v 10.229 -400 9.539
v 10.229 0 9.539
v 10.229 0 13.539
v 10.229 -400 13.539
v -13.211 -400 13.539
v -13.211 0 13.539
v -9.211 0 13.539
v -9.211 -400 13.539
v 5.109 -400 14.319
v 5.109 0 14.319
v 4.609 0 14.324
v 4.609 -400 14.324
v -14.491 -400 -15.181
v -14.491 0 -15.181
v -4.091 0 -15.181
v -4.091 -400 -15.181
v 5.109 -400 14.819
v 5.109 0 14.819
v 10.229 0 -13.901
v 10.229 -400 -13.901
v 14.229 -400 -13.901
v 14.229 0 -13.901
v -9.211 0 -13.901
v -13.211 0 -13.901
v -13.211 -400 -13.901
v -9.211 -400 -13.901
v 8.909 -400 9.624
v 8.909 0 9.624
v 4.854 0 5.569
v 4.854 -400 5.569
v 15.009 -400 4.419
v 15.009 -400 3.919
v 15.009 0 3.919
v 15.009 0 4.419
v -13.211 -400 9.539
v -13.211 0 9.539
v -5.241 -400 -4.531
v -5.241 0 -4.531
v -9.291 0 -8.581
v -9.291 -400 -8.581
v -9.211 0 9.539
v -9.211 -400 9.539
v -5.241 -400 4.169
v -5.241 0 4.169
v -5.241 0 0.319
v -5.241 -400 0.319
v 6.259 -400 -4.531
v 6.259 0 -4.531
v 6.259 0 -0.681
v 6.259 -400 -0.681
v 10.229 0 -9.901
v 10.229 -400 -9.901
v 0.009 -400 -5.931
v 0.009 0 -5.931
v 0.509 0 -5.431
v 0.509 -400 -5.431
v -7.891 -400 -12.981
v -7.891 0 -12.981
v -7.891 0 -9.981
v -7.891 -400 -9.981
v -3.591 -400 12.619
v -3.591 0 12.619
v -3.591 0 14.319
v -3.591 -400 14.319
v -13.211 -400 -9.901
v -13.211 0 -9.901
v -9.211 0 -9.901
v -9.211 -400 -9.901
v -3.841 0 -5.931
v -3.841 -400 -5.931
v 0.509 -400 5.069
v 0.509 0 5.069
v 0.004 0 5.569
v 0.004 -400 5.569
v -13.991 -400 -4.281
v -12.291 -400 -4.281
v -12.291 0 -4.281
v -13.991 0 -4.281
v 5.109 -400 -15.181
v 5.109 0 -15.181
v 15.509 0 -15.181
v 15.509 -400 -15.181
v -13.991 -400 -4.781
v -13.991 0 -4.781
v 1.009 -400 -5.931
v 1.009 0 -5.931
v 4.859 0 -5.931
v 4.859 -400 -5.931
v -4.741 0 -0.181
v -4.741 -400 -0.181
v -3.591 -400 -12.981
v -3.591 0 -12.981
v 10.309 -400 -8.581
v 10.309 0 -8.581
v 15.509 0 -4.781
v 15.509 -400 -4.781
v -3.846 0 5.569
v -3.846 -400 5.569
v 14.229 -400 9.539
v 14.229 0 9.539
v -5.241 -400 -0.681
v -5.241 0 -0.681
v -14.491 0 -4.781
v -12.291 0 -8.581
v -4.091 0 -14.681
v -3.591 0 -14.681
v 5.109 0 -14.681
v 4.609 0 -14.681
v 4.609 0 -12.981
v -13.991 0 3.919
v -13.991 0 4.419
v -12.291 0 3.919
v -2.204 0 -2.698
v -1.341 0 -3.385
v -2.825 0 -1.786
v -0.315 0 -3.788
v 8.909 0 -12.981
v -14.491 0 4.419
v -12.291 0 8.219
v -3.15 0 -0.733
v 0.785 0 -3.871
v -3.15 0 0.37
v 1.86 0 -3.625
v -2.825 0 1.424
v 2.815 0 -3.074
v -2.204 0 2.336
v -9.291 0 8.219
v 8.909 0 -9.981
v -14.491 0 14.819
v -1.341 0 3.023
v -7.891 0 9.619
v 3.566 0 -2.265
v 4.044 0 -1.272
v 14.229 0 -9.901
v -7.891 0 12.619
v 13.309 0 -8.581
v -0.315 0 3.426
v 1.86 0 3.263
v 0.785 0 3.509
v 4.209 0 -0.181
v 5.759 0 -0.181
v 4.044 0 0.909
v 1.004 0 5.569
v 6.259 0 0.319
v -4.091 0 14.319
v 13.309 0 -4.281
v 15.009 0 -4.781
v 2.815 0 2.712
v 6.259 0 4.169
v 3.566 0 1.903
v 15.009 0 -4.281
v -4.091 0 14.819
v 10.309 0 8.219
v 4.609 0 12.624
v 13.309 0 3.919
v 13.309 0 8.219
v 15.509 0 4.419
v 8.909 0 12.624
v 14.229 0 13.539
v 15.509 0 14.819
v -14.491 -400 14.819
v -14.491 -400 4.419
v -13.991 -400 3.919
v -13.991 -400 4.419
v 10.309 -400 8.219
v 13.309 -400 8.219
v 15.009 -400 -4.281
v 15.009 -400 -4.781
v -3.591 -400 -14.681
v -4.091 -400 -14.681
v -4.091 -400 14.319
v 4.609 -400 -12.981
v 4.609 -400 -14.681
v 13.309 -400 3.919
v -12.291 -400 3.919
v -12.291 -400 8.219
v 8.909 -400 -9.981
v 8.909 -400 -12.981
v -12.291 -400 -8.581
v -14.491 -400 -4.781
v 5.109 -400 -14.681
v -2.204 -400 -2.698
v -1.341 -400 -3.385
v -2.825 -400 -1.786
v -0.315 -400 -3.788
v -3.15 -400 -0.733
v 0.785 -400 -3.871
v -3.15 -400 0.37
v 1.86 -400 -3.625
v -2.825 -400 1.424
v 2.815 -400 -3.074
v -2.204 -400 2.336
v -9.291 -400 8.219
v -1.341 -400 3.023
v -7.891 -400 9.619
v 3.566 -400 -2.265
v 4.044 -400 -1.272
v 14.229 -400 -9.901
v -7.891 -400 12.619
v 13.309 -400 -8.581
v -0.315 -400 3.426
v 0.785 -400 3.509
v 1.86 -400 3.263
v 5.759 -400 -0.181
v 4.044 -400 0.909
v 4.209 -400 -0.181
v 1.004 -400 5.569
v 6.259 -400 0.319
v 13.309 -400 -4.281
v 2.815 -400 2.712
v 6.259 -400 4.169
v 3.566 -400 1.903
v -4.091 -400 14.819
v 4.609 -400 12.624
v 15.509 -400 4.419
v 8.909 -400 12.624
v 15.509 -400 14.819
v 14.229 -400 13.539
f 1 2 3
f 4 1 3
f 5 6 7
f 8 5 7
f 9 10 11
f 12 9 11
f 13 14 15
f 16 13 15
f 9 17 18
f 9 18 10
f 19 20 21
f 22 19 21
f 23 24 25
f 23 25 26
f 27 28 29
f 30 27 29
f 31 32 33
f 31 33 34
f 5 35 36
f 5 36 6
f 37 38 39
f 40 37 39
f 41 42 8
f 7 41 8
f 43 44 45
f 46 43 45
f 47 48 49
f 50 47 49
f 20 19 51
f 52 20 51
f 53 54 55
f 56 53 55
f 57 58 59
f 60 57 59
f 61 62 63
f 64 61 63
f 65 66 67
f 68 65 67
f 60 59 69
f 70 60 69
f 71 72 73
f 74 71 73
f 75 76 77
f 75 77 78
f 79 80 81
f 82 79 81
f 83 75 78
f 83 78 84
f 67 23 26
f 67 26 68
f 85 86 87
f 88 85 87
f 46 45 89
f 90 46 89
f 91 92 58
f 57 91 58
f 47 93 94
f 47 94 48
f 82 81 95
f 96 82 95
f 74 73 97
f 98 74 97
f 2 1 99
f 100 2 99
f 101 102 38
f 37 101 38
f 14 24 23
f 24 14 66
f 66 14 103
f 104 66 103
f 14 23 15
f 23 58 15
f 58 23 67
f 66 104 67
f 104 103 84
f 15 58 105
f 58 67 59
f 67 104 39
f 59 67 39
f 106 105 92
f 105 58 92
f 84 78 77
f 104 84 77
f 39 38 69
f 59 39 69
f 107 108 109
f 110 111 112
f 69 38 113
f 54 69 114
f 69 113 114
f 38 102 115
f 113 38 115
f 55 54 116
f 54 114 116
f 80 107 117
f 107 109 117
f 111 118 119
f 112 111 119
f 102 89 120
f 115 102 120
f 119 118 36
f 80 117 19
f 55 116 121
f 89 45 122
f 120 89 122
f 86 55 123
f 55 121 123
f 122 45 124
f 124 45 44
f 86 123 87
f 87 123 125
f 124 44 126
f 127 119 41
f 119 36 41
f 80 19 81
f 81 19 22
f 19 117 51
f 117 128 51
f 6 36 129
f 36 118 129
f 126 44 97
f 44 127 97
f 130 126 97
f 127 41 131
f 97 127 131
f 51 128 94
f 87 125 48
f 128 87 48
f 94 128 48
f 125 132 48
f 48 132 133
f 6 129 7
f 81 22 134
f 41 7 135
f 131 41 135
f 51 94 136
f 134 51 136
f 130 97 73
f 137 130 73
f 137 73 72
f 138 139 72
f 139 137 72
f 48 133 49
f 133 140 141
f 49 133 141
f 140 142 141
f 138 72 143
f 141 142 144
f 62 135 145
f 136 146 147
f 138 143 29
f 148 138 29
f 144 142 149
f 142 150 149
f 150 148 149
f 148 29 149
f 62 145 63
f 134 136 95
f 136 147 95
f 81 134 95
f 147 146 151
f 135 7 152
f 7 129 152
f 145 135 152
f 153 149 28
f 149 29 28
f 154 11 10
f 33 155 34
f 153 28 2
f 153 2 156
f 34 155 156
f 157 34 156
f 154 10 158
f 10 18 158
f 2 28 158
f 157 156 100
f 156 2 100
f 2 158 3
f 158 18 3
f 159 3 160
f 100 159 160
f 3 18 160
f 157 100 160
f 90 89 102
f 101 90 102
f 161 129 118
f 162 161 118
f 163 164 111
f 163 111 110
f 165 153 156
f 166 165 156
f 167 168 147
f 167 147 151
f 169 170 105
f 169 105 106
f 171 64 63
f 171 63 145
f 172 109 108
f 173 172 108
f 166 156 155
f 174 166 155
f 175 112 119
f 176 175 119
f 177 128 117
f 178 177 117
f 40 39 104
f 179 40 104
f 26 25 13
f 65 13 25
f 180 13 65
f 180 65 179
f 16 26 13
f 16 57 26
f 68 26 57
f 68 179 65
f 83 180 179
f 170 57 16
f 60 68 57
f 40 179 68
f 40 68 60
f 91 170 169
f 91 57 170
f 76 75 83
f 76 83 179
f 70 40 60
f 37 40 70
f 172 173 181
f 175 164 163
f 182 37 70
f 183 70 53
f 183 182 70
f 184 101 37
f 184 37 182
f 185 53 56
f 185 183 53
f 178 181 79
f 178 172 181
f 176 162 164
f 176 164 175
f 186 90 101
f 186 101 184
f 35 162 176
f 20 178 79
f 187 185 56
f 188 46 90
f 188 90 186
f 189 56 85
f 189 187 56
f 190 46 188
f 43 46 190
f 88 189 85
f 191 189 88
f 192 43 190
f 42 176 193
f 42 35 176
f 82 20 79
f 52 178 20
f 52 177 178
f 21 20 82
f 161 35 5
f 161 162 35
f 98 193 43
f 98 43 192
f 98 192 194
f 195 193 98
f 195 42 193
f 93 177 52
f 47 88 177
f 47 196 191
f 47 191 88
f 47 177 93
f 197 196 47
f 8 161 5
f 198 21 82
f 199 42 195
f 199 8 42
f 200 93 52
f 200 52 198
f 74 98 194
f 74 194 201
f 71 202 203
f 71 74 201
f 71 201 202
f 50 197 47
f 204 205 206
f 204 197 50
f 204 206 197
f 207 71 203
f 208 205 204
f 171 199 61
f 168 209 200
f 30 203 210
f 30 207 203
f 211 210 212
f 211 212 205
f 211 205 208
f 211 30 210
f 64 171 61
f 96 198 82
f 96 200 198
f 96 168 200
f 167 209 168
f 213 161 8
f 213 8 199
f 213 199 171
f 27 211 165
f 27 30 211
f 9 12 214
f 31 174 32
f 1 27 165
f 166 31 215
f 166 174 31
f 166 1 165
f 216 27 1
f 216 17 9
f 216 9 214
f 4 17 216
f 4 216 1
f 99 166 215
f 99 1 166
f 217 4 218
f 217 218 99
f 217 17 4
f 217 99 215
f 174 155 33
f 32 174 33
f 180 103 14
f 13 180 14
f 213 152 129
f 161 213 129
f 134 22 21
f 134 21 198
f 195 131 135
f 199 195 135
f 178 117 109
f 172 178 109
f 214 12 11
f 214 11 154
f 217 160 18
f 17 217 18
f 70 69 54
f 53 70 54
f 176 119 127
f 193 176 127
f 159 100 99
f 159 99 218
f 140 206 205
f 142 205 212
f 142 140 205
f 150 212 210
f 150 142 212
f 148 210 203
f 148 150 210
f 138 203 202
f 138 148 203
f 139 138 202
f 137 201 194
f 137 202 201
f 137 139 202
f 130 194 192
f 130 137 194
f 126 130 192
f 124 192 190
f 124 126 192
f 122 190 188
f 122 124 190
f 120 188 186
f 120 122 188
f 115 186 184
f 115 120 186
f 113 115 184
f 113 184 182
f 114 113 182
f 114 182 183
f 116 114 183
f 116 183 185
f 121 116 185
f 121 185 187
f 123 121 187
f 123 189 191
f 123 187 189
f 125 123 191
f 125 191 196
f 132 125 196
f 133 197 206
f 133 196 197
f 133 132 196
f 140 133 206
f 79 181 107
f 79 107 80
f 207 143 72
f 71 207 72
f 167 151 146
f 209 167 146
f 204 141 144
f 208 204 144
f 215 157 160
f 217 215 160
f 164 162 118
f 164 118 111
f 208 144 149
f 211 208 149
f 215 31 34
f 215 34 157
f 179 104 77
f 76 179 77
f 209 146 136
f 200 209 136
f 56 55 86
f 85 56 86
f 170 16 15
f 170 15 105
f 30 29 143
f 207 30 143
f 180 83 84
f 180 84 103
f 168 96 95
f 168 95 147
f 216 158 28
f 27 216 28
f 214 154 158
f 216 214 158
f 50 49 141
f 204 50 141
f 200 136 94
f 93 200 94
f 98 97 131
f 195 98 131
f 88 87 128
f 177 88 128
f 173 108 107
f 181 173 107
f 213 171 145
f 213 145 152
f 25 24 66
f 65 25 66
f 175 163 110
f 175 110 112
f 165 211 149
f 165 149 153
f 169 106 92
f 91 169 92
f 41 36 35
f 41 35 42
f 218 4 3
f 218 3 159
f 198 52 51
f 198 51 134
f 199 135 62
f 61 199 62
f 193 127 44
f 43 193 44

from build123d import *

# Parameters (mm, degrees)
F2_DEPTH = 400
F1_R     = 3.7
F1_W     = 4
F1_H     = 4
F3_DEPTH = 400.001


with BuildPart() as f2:
    # F0 (on Front) → F2 (new body)
    with BuildSketch(Plane.XZ):
        Polygon((-4.091443, 14.818899), (-14.491443, 14.818899), (-14.491443, 4.418899), (-13.991443, 4.418899), (-13.991443, 3.918899), (-12.291443, 3.918899), (-12.291443, 8.218899), (-9.291443, 8.218899), (-5.241443, 4.168899), (-5.241443, 0.318899), (-4.741443, -0.181101), (-5.241443, -0.681101), (-5.241443, -4.531101), (-9.291443, -8.581101), (-12.291443, -8.581101), (-12.291443, -4.281101), (-13.991443, -4.281101), (-13.991443, -4.781101), (-14.491443, -4.781101), (-14.491443, -15.181101), (-4.091443, -15.181101), (-4.091443, -14.681101), (-3.591443, -14.681101), (-3.591443, -12.981101), (-7.891443, -12.981101), (-7.891443, -9.981101), (-3.841443, -5.931101), (0.008557, -5.931101), (0.508557, -5.431101), (1.008557, -5.931101), (4.858557, -5.931101), (8.908557, -9.981101), (8.908557, -12.981101), (4.608557, -12.981101), (4.608557, -14.681101), (5.108532, -14.681101), (5.108532, -15.181101), (15.508557, -15.181101), (15.508557, -4.781101), (15.008557, -4.781101), (15.008557, -4.281101), (13.308557, -4.281101), (13.308557, -8.581101), (10.308557, -8.581101), (6.258557, -4.531101), (6.258557, -0.681101), (5.758557, -0.181101), (6.258557, 0.318899), (6.258557, 4.168899), (10.308557, 8.218899), (13.308557, 8.218899), (13.308557, 3.918899), (15.008557, 3.918899), (15.008557, 4.418899), (15.508557, 4.418899), (15.508557, 14.818899), (5.108532, 14.818899), (5.108532, 14.318899), (4.608557, 14.323857), (4.608557, 12.623857), (8.908557, 12.623857), (8.908557, 9.623857), (4.853598, 5.568899), (1.003598, 5.568899), (0.508557, 5.068899), (0.003549, 5.568899), (-3.846451, 5.568899), (-7.891443, 9.618899), (-7.891443, 12.618899), (-3.591443, 12.618899), (-3.591443, 14.318899), (-4.091443, 14.318899), align=None)
    extrude(amount=F2_DEPTH)

    # F1 (on Front) → F3 (cut, through all)
    with BuildSketch(Plane.XZ):
        with Locations((0.508557, -0.181101)):
            Circle(F1_R)
        with Locations((12.228557, 11.538899)):
            Rectangle(F1_W, F1_H)
        with Locations((12.228557, -11.901101)):
            Rectangle(F1_W, F1_H)
        with Locations((-11.211443, -11.901101)):
            Rectangle(F1_W, F1_H)
        with Locations((-11.211443, 11.53863)):
            Rectangle(F1_W, F1_H)
    extrude(amount=F3_DEPTH, mode=Mode.SUBTRACT)


solid = f2.part
